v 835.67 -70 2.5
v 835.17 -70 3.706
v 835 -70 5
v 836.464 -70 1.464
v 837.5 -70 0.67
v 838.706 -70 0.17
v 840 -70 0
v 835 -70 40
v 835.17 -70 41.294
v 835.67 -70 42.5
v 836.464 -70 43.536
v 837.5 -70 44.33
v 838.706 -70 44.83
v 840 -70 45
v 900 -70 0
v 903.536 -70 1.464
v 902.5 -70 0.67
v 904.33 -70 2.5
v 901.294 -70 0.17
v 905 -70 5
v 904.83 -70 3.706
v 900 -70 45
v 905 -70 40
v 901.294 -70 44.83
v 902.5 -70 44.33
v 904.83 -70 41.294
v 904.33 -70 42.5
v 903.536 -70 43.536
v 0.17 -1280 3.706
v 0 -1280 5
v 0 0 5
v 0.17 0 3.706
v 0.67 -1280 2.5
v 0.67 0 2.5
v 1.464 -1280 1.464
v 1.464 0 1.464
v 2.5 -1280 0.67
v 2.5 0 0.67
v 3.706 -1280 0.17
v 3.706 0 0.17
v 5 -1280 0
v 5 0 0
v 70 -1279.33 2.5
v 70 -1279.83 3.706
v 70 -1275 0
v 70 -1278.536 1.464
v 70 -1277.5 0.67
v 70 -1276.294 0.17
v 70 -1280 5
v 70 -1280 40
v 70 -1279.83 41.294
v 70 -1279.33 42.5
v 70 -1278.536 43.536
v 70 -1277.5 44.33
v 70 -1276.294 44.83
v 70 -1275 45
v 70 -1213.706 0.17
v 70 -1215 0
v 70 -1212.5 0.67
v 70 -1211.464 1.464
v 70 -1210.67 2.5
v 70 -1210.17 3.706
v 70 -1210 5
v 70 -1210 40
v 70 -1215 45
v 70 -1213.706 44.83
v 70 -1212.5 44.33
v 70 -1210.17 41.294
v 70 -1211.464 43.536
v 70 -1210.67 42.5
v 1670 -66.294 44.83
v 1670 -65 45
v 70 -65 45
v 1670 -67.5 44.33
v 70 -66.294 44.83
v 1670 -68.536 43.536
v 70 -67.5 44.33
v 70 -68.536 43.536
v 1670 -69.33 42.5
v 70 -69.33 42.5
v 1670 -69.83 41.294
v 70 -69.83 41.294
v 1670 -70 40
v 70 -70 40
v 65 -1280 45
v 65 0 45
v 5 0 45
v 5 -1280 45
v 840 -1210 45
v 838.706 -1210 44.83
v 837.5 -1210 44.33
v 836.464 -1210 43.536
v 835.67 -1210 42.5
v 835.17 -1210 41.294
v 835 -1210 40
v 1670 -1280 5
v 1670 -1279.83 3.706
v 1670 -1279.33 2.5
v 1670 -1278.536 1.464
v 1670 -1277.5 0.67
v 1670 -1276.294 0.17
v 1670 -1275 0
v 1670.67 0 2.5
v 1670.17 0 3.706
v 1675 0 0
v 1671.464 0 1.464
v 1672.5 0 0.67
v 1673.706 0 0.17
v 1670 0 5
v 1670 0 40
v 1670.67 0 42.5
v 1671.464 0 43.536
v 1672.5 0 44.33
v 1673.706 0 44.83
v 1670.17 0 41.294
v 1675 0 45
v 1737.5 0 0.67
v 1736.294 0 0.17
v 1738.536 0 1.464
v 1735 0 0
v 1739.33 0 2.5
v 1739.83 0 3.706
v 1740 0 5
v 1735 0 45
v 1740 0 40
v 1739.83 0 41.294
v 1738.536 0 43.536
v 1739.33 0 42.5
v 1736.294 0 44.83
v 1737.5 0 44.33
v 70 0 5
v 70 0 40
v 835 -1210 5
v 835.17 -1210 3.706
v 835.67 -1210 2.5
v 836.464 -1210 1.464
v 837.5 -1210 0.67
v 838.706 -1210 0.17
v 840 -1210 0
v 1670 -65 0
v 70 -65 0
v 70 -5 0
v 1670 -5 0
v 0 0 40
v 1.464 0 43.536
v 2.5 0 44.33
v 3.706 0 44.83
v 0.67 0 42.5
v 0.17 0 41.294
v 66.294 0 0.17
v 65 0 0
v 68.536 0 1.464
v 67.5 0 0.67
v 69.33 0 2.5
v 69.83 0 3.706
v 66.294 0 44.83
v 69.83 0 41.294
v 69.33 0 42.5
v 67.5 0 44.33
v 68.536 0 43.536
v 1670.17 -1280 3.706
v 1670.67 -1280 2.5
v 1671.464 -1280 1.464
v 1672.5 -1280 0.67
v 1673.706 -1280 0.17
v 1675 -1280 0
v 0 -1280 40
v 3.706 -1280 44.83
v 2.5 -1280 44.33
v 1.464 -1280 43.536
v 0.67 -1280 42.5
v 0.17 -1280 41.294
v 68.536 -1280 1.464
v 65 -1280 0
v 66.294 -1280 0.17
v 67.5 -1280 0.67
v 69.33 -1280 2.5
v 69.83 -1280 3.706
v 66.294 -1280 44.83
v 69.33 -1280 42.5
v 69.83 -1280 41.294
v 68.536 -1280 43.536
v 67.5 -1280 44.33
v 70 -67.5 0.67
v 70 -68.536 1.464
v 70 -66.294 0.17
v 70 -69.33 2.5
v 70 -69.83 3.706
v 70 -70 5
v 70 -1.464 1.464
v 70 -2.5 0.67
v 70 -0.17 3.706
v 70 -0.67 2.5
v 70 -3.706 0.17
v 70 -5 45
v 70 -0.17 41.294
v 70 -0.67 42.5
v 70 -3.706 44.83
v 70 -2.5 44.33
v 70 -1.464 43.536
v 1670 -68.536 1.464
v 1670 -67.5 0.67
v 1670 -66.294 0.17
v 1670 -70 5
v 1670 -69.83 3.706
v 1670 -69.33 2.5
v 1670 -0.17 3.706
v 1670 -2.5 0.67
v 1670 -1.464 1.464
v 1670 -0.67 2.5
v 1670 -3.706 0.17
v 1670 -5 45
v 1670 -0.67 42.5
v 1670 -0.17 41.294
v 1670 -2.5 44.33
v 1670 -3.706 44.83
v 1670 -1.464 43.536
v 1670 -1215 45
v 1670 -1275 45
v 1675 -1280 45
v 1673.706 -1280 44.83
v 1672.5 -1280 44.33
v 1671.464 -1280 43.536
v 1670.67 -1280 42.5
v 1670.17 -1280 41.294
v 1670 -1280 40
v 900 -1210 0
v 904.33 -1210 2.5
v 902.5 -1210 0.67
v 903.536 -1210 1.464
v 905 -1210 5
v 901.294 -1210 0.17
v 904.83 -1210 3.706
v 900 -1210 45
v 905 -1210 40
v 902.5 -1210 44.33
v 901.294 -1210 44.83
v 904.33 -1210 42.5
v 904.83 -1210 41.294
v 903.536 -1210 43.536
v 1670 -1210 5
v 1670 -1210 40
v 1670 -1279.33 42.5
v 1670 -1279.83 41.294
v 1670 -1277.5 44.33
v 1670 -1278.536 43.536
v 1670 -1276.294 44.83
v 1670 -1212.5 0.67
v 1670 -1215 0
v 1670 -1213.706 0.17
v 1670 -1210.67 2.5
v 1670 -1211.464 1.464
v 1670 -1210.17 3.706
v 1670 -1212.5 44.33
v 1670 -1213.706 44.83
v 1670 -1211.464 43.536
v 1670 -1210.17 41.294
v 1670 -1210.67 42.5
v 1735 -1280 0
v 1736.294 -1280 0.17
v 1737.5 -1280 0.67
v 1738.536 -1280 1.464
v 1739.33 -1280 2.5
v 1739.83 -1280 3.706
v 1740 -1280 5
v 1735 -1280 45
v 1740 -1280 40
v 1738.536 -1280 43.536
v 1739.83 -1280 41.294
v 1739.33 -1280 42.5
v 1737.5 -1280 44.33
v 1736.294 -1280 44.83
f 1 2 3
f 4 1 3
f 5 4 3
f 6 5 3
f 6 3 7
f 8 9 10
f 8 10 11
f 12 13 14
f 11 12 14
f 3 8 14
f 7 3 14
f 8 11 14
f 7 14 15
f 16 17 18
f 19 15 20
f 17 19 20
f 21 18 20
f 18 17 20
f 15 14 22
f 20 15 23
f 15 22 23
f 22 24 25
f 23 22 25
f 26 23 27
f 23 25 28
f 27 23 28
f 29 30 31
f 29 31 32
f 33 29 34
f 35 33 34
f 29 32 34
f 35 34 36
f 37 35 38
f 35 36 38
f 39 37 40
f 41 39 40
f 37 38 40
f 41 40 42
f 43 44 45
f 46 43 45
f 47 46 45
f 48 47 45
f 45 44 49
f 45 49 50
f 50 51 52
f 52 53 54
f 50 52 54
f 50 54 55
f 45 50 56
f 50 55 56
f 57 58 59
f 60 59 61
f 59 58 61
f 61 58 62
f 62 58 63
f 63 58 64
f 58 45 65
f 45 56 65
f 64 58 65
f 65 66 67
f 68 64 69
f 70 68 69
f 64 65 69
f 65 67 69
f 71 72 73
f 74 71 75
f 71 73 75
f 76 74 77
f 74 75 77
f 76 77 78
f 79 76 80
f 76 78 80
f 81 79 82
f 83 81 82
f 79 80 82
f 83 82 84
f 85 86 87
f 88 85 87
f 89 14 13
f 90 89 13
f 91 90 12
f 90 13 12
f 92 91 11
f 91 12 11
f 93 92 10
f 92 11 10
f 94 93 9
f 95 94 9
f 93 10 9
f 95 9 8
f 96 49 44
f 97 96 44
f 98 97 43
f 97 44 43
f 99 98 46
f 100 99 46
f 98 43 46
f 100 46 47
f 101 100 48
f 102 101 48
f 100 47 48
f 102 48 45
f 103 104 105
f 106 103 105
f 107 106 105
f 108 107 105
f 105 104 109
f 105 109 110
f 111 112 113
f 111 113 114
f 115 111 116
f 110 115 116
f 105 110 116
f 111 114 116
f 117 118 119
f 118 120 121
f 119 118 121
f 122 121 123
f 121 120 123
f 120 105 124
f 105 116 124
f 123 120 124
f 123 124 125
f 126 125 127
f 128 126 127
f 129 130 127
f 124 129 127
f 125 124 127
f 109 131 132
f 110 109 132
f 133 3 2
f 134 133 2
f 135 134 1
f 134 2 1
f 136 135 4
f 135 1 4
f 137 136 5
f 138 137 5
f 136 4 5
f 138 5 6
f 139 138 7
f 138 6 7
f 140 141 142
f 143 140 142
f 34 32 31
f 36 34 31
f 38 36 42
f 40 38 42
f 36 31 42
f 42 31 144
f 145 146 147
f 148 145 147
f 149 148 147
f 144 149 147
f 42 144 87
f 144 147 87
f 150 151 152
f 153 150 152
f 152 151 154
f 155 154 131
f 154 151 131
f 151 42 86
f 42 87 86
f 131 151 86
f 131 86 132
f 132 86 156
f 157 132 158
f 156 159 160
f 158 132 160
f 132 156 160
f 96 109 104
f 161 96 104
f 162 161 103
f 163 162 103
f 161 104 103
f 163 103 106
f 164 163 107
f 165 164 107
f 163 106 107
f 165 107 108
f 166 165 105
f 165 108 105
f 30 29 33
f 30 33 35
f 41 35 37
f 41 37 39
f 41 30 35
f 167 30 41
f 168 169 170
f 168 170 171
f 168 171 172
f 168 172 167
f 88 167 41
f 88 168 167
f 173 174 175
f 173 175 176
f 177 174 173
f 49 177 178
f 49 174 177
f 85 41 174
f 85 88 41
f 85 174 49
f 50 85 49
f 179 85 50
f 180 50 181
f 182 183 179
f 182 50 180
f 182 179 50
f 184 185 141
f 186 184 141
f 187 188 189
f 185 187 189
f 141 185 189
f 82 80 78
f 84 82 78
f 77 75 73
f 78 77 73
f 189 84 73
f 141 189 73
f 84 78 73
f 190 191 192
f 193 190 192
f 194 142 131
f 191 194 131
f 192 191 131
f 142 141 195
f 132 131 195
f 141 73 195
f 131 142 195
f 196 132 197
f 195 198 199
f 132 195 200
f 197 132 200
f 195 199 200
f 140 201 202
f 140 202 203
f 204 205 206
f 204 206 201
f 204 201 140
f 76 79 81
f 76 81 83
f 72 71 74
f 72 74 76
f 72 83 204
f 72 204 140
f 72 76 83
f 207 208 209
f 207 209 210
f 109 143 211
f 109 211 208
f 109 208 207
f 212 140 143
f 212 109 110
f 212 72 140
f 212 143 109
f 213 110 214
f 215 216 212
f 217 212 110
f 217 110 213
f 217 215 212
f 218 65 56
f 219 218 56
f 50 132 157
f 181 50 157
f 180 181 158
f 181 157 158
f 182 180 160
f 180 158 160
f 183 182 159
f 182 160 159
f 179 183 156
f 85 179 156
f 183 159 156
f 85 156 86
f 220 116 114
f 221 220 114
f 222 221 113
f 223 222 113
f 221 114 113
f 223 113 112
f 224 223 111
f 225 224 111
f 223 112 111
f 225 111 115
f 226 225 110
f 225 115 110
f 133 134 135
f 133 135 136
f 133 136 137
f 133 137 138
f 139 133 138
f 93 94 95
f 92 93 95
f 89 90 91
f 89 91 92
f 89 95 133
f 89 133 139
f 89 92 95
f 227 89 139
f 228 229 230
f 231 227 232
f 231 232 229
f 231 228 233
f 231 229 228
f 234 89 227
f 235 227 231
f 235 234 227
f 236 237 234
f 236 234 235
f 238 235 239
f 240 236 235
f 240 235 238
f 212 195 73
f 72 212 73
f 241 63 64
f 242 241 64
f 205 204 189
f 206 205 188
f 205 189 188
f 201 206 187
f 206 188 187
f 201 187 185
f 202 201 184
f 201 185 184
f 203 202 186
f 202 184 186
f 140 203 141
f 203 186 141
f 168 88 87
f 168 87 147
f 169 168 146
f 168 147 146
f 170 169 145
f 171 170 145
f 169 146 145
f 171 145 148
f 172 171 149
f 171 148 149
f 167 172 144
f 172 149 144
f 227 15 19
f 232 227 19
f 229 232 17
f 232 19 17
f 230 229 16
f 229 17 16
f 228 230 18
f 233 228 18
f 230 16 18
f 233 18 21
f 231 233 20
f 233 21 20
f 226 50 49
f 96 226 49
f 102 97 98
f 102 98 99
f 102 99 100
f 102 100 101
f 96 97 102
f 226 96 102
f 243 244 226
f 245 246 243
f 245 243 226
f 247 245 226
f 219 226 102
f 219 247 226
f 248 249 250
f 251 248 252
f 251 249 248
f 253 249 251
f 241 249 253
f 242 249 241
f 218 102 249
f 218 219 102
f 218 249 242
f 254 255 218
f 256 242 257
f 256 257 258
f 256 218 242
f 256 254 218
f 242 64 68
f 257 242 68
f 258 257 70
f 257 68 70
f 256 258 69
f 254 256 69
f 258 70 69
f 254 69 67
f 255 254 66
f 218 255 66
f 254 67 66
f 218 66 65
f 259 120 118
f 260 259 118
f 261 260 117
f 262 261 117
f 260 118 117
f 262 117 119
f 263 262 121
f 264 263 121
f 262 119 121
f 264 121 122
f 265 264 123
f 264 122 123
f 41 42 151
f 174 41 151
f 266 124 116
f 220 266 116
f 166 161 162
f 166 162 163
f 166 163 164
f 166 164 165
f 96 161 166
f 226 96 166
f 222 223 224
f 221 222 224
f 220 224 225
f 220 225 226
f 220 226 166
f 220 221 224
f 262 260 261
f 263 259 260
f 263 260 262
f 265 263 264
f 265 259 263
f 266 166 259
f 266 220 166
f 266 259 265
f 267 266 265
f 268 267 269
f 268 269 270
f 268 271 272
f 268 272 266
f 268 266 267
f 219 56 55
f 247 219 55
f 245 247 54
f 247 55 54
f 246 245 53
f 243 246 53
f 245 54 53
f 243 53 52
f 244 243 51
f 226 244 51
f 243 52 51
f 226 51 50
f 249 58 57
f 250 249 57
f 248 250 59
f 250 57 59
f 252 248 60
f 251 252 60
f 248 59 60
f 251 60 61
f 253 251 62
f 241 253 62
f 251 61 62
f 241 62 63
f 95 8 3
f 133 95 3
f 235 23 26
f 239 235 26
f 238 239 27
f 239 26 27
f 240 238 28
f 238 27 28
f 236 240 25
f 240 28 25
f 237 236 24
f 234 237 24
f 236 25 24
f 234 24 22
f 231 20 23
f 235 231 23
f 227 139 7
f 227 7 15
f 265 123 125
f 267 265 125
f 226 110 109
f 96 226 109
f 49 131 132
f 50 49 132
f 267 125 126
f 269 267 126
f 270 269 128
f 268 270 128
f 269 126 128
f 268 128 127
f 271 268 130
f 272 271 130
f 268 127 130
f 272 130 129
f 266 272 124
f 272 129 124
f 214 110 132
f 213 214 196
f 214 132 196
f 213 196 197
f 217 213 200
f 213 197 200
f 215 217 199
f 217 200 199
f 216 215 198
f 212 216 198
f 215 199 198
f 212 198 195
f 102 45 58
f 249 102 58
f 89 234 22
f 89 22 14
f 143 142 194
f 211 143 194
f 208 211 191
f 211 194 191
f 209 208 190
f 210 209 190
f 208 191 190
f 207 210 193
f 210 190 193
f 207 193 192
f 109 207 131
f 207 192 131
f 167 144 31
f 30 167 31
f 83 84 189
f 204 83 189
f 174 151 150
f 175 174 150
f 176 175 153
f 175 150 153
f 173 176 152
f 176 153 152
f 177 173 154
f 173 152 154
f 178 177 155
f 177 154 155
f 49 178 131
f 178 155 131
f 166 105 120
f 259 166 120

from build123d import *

# Parameters (mm, degrees)
F1_DEPTH = 1280
F3_DEPTH = 1600
F5_DEPTH = 1140


with BuildPart() as f1:
    # F0 (on Front) → F1 (new body)
    with BuildSketch(Plane.XZ):
        with BuildLine():
            ThreePointArc((0, 5), (1.464466, 1.464466), (5, 0))
            Line((5, 0), (65, 0))
            ThreePointArc((65, 0), (68.535534, 1.464466), (70, 5))
            Line((70, 5), (70, 40))
            ThreePointArc((70, 40), (68.535534, 43.535534), (65, 45))
            Line((65, 45), (5, 45))
            ThreePointArc((5, 45), (1.464466, 43.535534), (0, 40))
            Line((0, 40), (0, 5))
        make_face()
        with BuildLine():
            ThreePointArc((1670, 5), (1671.464466, 1.464466), (1675, 0))
            Line((1675, 0), (1735, 0))
            ThreePointArc((1735, 0), (1738.535534, 1.464466), (1740, 5))
            Line((1740, 5), (1740, 40))
            ThreePointArc((1740, 40), (1738.535534, 43.535534), (1735, 45))
            Line((1735, 45), (1675, 45))
            ThreePointArc((1675, 45), (1671.464466, 43.535534), (1670, 40))
            Line((1670, 40), (1670, 5))
        make_face()
    extrude(amount=F1_DEPTH)


with BuildPart() as f3:
    # F2 (on face) → F3 (new body, through all)
    with BuildSketch(Plane.YZ.offset(70)):
        with BuildLine():
            Line((-1215, 45), (-1275, 45))
            ThreePointArc((-1275, 45), (-1278.535534, 43.535534), (-1280, 40))
            Line((-1280, 40), (-1280, 5))
            ThreePointArc((-1280, 5), (-1278.535534, 1.464466), (-1275, 0))
            Line((-1275, 0), (-1215, 0))
            ThreePointArc((-1215, 0), (-1211.464466, 1.464466), (-1210, 5))
            Line((-1210, 5), (-1210, 40))
            ThreePointArc((-1210, 40), (-1211.464466, 43.535534), (-1215, 45))
        make_face()
        with BuildLine():
            Line((-65, 0), (-5, 0))
            ThreePointArc((-5, 0), (-1.464466, 1.464466), (0, 5))
            Line((0, 5), (0, 40))
            ThreePointArc((0, 40), (-1.464466, 43.535534), (-5, 45))
            Line((-5, 45), (-65, 45))
            ThreePointArc((-65, 45), (-68.535534, 43.535534), (-70, 40))
            Line((-70, 40), (-70, 5))
            ThreePointArc((-70, 5), (-68.535534, 1.464466), (-65, 0))
        make_face()
    extrude(amount=F3_DEPTH)


with BuildPart() as f5:
    # F4 (on face) → F5 (new body, through all)
    with BuildSketch(Plane.XZ.offset(70)):
        with BuildLine():
            ThreePointArc((835, 5), (836.464466, 1.464466), (840, 0))
            Line((840, 0), (900, 0))
            ThreePointArc((900, 0), (903.535534, 1.464466), (905, 5))
            Line((905, 5), (905, 40))
            ThreePointArc((905, 40), (903.535534, 43.535534), (900, 45))
            Line((900, 45), (840, 45))
            ThreePointArc((840, 45), (836.464466, 43.535534), (835, 40))
            Line((835, 40), (835, 5))
        make_face()
    extrude(amount=F5_DEPTH)


solid = Compound([f1.part, f3.part, f5.part])
